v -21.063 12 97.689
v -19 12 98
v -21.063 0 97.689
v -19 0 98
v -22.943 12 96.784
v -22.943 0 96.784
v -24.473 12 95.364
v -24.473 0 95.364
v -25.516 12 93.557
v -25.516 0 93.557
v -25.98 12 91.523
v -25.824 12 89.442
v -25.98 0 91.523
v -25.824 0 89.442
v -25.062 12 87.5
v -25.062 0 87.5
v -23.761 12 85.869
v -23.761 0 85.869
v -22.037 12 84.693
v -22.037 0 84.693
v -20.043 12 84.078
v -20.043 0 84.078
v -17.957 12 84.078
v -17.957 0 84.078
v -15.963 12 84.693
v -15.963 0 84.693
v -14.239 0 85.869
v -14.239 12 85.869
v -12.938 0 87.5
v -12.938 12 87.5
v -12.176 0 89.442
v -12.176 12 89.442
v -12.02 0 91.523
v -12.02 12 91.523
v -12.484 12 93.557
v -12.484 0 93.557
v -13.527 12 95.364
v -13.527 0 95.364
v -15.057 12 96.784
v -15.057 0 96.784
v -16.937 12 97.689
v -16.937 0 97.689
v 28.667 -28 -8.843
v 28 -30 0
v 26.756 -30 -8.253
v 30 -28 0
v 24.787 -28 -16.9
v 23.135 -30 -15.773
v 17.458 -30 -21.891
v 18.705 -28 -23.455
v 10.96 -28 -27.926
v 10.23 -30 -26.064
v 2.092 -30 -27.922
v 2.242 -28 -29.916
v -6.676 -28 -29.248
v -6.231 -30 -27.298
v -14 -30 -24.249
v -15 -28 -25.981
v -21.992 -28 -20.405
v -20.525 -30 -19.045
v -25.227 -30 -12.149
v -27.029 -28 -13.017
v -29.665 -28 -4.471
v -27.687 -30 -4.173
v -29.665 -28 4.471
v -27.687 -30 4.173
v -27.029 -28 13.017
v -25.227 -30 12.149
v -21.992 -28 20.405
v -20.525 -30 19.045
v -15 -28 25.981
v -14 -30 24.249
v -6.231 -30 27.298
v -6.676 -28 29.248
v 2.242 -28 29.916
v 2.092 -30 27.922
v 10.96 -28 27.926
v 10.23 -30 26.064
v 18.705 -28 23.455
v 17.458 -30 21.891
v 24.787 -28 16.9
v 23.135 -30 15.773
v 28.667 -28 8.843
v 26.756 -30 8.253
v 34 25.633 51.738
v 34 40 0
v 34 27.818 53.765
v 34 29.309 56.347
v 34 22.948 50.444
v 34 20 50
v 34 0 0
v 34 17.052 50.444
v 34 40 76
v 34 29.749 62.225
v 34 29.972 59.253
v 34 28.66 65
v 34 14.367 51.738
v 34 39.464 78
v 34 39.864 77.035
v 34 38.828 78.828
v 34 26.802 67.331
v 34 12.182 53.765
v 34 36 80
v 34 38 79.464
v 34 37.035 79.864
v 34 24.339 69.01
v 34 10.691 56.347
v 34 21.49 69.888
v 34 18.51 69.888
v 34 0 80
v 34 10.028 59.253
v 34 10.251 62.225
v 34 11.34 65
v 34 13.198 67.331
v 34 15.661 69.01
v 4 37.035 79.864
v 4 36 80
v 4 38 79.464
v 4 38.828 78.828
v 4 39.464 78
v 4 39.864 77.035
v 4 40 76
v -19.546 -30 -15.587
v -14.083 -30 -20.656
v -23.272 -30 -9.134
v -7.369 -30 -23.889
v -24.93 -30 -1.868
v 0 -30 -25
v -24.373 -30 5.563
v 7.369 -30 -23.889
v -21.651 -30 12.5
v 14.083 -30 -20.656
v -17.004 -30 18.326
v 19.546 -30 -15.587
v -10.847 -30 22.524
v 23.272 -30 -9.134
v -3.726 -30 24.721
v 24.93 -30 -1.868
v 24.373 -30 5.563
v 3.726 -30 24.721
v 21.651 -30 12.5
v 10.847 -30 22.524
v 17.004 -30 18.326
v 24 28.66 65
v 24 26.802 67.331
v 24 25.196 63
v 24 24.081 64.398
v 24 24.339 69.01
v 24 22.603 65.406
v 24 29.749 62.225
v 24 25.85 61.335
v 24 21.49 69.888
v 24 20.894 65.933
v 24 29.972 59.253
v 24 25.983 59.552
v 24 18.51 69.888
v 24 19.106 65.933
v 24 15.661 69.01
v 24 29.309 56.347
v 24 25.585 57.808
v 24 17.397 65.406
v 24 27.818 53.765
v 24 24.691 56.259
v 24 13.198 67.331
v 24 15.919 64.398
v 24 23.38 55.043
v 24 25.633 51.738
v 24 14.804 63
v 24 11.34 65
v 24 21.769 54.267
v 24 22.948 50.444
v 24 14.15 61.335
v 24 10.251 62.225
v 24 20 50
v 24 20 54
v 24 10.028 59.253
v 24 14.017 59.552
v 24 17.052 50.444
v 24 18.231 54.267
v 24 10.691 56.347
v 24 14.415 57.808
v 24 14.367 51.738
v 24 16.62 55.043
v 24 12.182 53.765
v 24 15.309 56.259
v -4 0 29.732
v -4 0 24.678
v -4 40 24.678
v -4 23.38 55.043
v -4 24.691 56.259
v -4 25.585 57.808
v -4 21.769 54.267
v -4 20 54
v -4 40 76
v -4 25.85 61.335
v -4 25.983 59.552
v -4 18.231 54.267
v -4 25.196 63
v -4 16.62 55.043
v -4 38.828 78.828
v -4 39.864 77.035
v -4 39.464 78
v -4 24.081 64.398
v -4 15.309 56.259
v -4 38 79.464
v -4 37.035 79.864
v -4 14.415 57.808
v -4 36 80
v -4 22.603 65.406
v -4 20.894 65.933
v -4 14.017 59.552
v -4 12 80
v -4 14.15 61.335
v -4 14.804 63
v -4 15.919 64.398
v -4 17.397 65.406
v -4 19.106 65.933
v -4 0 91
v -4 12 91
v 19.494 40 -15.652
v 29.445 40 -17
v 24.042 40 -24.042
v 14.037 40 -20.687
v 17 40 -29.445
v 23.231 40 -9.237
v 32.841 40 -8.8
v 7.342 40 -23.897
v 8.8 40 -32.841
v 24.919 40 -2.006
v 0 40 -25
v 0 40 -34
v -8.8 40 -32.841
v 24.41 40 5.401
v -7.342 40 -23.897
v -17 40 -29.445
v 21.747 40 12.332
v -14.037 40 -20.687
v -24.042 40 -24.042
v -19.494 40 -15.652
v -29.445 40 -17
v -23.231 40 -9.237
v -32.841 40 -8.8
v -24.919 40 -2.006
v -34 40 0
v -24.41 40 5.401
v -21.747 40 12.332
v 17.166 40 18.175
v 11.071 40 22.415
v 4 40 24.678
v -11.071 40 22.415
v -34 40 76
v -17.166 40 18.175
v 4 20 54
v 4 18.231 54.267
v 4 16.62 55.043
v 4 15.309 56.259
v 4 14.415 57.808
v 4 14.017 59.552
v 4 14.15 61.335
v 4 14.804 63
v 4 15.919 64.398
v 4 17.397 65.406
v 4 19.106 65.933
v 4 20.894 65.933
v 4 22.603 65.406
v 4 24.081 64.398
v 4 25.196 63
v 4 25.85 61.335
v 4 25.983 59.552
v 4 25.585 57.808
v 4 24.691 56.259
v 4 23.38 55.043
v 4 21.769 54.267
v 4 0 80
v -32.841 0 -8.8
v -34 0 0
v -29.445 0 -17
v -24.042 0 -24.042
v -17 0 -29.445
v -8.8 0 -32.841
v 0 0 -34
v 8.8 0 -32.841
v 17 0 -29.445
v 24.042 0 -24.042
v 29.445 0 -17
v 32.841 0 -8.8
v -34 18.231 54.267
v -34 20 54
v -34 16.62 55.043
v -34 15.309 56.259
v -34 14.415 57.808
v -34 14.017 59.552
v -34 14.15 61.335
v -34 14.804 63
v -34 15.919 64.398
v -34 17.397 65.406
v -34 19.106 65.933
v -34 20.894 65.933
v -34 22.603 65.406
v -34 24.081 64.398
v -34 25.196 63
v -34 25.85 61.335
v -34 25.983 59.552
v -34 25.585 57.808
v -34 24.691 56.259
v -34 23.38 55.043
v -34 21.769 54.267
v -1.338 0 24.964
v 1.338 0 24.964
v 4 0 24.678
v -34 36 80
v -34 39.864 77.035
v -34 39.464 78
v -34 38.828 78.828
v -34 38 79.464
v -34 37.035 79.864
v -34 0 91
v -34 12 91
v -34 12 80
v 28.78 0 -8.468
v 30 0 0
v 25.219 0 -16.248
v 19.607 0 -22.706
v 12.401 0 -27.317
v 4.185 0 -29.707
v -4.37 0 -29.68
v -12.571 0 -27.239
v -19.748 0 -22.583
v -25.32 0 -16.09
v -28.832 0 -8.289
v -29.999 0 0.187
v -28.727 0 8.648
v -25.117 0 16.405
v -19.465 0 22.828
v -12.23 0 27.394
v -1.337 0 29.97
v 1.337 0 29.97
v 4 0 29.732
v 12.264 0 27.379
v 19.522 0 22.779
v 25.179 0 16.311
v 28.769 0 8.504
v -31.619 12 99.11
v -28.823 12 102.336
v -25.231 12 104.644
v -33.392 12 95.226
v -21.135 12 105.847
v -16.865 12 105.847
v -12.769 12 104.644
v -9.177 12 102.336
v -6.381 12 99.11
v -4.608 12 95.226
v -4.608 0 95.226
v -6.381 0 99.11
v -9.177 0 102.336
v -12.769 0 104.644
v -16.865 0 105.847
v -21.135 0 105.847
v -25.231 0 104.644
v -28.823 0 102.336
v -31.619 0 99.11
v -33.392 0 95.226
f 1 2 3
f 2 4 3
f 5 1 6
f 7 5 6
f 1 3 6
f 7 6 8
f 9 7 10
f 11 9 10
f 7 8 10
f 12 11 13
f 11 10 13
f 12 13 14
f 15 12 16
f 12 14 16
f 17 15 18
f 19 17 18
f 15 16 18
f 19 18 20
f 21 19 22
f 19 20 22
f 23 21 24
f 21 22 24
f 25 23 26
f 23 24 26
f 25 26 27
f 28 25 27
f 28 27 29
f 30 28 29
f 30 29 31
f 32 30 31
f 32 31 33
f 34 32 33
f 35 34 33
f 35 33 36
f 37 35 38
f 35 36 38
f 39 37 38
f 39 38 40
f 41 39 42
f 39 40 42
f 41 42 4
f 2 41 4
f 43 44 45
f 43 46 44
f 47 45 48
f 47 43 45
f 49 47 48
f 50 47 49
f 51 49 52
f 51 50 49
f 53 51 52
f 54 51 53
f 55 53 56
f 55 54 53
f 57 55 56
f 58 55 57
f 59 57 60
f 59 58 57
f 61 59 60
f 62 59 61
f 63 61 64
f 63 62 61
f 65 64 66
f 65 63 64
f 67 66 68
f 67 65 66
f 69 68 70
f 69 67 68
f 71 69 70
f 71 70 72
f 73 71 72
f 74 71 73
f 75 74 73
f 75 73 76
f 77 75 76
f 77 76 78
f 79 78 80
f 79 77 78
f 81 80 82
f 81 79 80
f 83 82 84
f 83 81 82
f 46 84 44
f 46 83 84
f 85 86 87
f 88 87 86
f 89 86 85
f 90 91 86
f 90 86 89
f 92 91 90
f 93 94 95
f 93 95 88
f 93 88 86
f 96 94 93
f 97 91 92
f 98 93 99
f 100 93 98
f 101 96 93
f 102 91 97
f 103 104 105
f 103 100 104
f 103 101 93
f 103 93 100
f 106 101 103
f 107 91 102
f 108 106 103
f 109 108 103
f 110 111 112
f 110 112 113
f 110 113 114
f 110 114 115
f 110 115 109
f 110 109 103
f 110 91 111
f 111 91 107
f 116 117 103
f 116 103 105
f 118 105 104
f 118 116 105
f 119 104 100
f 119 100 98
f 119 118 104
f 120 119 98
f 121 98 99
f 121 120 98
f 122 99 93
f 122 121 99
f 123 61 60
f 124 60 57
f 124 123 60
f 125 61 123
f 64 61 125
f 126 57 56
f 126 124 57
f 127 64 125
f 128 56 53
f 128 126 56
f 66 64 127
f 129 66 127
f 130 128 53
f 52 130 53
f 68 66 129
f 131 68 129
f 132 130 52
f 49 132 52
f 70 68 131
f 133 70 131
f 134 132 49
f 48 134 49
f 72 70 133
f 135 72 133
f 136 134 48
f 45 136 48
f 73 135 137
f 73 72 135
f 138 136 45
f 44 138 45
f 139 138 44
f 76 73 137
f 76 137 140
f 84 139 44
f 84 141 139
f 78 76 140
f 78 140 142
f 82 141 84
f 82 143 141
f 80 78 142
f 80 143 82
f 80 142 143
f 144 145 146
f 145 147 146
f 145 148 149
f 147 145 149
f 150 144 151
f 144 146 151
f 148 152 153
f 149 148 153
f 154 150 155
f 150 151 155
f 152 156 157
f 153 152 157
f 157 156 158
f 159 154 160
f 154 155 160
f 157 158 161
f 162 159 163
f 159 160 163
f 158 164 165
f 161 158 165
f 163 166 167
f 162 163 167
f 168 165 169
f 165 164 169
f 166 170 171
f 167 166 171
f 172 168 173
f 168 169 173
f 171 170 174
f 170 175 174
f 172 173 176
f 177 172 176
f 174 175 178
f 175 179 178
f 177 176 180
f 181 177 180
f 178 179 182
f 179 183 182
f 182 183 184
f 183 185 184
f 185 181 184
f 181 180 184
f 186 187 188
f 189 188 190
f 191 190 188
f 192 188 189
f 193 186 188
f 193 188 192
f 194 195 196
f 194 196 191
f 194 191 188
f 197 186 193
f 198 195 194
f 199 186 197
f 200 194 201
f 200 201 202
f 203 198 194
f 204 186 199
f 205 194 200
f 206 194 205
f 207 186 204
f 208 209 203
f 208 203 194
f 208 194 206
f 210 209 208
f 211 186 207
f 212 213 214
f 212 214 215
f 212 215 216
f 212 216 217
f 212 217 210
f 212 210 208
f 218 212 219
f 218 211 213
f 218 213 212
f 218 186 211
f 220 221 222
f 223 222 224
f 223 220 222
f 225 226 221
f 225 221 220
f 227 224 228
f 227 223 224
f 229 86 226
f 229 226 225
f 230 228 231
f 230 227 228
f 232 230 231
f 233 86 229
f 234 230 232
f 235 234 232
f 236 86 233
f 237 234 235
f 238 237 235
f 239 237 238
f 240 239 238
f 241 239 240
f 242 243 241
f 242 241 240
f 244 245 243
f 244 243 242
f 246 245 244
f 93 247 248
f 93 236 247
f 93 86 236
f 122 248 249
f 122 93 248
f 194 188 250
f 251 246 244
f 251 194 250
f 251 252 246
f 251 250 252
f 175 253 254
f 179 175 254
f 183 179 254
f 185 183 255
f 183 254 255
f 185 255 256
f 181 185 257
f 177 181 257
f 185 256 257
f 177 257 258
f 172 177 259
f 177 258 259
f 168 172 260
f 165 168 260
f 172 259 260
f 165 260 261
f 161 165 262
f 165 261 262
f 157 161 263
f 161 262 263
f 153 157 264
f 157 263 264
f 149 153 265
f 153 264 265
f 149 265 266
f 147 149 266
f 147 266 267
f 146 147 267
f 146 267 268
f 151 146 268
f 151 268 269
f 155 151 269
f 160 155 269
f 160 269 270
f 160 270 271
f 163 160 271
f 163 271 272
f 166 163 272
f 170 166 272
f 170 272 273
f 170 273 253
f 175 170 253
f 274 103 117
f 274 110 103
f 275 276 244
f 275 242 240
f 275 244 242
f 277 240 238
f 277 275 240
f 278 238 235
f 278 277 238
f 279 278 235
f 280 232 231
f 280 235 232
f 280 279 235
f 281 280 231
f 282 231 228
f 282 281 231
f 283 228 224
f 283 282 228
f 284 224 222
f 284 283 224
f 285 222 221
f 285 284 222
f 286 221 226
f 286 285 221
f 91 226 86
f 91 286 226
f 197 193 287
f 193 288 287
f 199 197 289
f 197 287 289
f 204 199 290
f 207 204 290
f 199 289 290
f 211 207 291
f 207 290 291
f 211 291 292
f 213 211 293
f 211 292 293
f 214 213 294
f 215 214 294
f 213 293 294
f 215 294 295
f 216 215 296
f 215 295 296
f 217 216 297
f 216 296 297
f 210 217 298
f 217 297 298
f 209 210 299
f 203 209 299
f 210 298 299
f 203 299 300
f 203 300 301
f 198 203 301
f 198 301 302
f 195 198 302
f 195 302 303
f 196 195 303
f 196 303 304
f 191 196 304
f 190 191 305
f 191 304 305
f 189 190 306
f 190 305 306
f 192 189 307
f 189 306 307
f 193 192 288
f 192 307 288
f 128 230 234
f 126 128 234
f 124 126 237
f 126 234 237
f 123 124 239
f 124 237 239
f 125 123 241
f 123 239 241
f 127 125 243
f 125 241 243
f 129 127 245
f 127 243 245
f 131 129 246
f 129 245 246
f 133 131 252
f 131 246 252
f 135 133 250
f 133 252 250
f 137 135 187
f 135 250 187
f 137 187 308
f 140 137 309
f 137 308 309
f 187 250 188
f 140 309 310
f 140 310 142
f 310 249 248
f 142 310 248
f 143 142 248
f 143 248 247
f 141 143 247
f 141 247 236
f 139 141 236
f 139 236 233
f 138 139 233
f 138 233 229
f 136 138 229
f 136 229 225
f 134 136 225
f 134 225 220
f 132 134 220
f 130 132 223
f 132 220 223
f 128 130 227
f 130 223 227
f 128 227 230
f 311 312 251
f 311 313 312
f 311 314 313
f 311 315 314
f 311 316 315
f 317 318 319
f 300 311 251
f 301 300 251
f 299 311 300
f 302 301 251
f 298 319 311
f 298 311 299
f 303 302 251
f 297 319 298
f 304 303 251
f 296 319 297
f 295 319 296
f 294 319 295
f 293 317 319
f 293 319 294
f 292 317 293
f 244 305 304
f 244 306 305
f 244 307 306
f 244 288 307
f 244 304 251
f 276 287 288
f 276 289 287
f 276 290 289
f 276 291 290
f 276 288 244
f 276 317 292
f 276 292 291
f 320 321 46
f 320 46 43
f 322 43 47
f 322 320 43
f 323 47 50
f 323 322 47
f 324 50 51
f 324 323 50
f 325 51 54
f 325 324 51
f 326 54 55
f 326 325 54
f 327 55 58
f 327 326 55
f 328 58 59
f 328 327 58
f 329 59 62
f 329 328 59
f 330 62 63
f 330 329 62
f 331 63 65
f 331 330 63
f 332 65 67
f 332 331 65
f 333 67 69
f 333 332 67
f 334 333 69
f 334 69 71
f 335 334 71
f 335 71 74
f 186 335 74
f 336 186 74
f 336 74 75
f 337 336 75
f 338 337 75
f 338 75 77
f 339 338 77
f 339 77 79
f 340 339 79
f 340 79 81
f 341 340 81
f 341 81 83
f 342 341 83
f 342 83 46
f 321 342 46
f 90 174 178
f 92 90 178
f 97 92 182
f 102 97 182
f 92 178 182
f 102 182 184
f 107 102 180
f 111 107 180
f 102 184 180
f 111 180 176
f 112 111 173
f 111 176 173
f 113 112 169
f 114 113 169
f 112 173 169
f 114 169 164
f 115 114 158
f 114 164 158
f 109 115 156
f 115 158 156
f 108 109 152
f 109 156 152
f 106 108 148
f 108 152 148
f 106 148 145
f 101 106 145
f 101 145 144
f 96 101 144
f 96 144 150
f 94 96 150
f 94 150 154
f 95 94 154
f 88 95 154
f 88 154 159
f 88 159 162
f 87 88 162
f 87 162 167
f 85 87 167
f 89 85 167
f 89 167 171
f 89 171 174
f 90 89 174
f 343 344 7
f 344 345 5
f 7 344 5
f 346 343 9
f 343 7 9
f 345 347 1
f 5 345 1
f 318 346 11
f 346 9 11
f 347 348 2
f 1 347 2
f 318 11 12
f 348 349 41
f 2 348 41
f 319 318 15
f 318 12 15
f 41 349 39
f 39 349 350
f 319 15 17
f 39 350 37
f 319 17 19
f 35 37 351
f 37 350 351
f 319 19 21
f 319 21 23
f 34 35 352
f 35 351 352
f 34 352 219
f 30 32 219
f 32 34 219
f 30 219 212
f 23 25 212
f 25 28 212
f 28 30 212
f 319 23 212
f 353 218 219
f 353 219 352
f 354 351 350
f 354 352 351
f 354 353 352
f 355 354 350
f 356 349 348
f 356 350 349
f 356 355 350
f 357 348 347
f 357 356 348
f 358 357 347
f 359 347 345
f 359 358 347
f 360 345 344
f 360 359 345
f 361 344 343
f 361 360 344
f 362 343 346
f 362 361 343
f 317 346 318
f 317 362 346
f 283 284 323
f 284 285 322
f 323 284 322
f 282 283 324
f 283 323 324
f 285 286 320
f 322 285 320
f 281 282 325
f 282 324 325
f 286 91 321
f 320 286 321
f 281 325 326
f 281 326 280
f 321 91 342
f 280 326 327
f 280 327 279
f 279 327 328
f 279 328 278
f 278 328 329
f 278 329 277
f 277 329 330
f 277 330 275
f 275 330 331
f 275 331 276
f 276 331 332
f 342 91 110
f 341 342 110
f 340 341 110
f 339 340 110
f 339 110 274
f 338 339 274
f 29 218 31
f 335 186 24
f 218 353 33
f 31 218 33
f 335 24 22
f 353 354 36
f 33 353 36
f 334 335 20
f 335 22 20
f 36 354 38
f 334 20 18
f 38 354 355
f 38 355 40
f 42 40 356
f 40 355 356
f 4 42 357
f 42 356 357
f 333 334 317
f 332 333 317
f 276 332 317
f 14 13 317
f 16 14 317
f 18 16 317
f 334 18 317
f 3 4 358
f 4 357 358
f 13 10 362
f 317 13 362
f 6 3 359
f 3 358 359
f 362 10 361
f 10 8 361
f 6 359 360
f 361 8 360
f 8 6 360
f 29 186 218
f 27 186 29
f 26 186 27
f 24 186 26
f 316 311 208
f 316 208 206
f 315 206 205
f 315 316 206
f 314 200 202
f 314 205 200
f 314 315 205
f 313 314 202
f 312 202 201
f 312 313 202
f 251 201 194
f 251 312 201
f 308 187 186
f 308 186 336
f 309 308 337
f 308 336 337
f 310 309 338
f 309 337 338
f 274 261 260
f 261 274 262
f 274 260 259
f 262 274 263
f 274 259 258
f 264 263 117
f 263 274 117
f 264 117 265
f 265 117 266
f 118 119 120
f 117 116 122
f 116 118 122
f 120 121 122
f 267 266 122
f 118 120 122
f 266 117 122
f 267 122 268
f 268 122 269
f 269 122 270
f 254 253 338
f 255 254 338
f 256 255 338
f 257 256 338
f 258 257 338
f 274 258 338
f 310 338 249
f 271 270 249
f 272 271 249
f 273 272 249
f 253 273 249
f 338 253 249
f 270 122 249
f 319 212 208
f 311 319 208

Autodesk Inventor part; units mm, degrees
ref_plane "YZ Plane" through (0, 0, 0) normal (1, 0, 0) x (0, 1, 0)
ref_plane "XZ Plane" through (0, 0, 0) normal (0, 1, 0) x (-1, 0, 0)
ref_plane "XY Plane" through (0, 0, 0) normal (0, 0, 1) x (1, 0, 0)
sketch "Sketch1" plane through (0, 0, 0) normal (0, 1, 0) x (-1, 0, 0)
  line L0 (34, 91) -> (34, 0)
  arc A0 (-34, 0) -> (34, 0) centre (0, 0) ccw
  line L1 (-34, 0) -> (-34, 80)
  line L2 (-34, 80) -> (4, 80)
  line L3 (4, 80) -> (4, 91)
  arc A1 (34, 91) -> (4, 91) centre (19, 91) ccw
  dimension "d0" = 34
  dimension "d1" = 15
  dimension "d2" = 91
  dimension "d3" = 80
extrude "Extrusion1" add sketch "Sketch1" along normal blind 40
sketch "Sketch2" plane through (0, 40, 0) normal (0, 1, 0) x (1, 0, 0)
  line L0 (-4, -80) -> (34, -80) projected
  arc A0 (34, 0) -> (-34, 0) centre (0, 0) ccw projected
  line L1 (-4, -80) -> (4, -80)
  line L2 (4, -80) -> (4, 0)
  line L3 (4, 0) -> (-4, 0)
  line L4 (-4, 0) -> (-4, -80)
  dimension "d6" = 8
extrude "Extrusion2" cut sketch "Sketch2" against normal through all
sketch "Sketch3" plane through (-4, 0, 91) normal (1, 0, 0) x (0, 0, -1)
  line L0 (0, 40) -> (91, 40) projected
  line L1 (11, 0) -> (11, 40) projected
  line L2 (-15, 0) -> (-15, 40) projected
  line L3 (11, 40) -> (-15, 40)
  line L4 (-15, 40) -> (-15, 12)
  line L5 (-15, 12) -> (11, 12)
  line L6 (11, 12) -> (11, 40)
  line L7 (0, 0) -> (-15, 0) projected
  point P0 (11, 12)
  dimension "d9" = 12
extrude "Extrusion3" cut sketch "Sketch3" against normal through all
sketch "Sketch4" plane through (0, 0, 0) normal (0, -1, 0) x (1, 0, 0)
  line L0 (4, 80) -> (4, 0) projected
  line L1 (4, 0) -> (-4, 0) projected
  line L2 (-4, 91) -> (-4, 0) projected
  arc A0 (-34, 0) -> (34, 0) centre (0, 0) ccw projected
  circle A1 centre (0, 0) radius 30
  point P0 (-4, 29.7321)
  point P1 (4, 29.7321)
  dimension "d12" = 60
extrude "Extrusion4" add sketch "Sketch4" along normal blind 30
chamfer "Chamfer1" distance 2 angle 45 1 edges at (-4, -30, -29.7321)
fillet "Fillet1" radius 4 2 edges at (-19, 40, 80) (19, 40, 80)
sketch "Sketch5" plane through (-4, 12, 91) normal (0, 1, 0) x (1, 0, 0)
  arc A0 (-30, 0) -> (0, 0) centre (-15, 0) ccw projected
  point P0 (4, 91)
hole "Hole1" at (-19, 12, 91) direction (0, -1, 0) diameter 14 end through all
sketch "Sketch6" plane through (0, -30, 0) normal (0, -1, 0) x (1, 0, 0)
  circle A0 centre (0, 0) radius 28 projected
hole "Hole2" at (0, -30, 0) direction (0, 1, 0) diameter 50 end through all
sketch "Sketch7" plane through (34, 0, 80) normal (1, 0, 0) x (0, 0, -1)
  line L0 (80, 0) -> (80, 40) projected
  line L1 (4, 40) -> (80, 40) projected
  point P0 (20, 20)
  dimension "d33" = 60
  dimension "d34" = 20
hole "Hole3" at (34, 20, 60) direction (-1, 0, 0) diameter 12 end through all counterbore diameter 20 counterbore depth 10
properties part number "Part030. Notched attach" material "Steel, Cast"
